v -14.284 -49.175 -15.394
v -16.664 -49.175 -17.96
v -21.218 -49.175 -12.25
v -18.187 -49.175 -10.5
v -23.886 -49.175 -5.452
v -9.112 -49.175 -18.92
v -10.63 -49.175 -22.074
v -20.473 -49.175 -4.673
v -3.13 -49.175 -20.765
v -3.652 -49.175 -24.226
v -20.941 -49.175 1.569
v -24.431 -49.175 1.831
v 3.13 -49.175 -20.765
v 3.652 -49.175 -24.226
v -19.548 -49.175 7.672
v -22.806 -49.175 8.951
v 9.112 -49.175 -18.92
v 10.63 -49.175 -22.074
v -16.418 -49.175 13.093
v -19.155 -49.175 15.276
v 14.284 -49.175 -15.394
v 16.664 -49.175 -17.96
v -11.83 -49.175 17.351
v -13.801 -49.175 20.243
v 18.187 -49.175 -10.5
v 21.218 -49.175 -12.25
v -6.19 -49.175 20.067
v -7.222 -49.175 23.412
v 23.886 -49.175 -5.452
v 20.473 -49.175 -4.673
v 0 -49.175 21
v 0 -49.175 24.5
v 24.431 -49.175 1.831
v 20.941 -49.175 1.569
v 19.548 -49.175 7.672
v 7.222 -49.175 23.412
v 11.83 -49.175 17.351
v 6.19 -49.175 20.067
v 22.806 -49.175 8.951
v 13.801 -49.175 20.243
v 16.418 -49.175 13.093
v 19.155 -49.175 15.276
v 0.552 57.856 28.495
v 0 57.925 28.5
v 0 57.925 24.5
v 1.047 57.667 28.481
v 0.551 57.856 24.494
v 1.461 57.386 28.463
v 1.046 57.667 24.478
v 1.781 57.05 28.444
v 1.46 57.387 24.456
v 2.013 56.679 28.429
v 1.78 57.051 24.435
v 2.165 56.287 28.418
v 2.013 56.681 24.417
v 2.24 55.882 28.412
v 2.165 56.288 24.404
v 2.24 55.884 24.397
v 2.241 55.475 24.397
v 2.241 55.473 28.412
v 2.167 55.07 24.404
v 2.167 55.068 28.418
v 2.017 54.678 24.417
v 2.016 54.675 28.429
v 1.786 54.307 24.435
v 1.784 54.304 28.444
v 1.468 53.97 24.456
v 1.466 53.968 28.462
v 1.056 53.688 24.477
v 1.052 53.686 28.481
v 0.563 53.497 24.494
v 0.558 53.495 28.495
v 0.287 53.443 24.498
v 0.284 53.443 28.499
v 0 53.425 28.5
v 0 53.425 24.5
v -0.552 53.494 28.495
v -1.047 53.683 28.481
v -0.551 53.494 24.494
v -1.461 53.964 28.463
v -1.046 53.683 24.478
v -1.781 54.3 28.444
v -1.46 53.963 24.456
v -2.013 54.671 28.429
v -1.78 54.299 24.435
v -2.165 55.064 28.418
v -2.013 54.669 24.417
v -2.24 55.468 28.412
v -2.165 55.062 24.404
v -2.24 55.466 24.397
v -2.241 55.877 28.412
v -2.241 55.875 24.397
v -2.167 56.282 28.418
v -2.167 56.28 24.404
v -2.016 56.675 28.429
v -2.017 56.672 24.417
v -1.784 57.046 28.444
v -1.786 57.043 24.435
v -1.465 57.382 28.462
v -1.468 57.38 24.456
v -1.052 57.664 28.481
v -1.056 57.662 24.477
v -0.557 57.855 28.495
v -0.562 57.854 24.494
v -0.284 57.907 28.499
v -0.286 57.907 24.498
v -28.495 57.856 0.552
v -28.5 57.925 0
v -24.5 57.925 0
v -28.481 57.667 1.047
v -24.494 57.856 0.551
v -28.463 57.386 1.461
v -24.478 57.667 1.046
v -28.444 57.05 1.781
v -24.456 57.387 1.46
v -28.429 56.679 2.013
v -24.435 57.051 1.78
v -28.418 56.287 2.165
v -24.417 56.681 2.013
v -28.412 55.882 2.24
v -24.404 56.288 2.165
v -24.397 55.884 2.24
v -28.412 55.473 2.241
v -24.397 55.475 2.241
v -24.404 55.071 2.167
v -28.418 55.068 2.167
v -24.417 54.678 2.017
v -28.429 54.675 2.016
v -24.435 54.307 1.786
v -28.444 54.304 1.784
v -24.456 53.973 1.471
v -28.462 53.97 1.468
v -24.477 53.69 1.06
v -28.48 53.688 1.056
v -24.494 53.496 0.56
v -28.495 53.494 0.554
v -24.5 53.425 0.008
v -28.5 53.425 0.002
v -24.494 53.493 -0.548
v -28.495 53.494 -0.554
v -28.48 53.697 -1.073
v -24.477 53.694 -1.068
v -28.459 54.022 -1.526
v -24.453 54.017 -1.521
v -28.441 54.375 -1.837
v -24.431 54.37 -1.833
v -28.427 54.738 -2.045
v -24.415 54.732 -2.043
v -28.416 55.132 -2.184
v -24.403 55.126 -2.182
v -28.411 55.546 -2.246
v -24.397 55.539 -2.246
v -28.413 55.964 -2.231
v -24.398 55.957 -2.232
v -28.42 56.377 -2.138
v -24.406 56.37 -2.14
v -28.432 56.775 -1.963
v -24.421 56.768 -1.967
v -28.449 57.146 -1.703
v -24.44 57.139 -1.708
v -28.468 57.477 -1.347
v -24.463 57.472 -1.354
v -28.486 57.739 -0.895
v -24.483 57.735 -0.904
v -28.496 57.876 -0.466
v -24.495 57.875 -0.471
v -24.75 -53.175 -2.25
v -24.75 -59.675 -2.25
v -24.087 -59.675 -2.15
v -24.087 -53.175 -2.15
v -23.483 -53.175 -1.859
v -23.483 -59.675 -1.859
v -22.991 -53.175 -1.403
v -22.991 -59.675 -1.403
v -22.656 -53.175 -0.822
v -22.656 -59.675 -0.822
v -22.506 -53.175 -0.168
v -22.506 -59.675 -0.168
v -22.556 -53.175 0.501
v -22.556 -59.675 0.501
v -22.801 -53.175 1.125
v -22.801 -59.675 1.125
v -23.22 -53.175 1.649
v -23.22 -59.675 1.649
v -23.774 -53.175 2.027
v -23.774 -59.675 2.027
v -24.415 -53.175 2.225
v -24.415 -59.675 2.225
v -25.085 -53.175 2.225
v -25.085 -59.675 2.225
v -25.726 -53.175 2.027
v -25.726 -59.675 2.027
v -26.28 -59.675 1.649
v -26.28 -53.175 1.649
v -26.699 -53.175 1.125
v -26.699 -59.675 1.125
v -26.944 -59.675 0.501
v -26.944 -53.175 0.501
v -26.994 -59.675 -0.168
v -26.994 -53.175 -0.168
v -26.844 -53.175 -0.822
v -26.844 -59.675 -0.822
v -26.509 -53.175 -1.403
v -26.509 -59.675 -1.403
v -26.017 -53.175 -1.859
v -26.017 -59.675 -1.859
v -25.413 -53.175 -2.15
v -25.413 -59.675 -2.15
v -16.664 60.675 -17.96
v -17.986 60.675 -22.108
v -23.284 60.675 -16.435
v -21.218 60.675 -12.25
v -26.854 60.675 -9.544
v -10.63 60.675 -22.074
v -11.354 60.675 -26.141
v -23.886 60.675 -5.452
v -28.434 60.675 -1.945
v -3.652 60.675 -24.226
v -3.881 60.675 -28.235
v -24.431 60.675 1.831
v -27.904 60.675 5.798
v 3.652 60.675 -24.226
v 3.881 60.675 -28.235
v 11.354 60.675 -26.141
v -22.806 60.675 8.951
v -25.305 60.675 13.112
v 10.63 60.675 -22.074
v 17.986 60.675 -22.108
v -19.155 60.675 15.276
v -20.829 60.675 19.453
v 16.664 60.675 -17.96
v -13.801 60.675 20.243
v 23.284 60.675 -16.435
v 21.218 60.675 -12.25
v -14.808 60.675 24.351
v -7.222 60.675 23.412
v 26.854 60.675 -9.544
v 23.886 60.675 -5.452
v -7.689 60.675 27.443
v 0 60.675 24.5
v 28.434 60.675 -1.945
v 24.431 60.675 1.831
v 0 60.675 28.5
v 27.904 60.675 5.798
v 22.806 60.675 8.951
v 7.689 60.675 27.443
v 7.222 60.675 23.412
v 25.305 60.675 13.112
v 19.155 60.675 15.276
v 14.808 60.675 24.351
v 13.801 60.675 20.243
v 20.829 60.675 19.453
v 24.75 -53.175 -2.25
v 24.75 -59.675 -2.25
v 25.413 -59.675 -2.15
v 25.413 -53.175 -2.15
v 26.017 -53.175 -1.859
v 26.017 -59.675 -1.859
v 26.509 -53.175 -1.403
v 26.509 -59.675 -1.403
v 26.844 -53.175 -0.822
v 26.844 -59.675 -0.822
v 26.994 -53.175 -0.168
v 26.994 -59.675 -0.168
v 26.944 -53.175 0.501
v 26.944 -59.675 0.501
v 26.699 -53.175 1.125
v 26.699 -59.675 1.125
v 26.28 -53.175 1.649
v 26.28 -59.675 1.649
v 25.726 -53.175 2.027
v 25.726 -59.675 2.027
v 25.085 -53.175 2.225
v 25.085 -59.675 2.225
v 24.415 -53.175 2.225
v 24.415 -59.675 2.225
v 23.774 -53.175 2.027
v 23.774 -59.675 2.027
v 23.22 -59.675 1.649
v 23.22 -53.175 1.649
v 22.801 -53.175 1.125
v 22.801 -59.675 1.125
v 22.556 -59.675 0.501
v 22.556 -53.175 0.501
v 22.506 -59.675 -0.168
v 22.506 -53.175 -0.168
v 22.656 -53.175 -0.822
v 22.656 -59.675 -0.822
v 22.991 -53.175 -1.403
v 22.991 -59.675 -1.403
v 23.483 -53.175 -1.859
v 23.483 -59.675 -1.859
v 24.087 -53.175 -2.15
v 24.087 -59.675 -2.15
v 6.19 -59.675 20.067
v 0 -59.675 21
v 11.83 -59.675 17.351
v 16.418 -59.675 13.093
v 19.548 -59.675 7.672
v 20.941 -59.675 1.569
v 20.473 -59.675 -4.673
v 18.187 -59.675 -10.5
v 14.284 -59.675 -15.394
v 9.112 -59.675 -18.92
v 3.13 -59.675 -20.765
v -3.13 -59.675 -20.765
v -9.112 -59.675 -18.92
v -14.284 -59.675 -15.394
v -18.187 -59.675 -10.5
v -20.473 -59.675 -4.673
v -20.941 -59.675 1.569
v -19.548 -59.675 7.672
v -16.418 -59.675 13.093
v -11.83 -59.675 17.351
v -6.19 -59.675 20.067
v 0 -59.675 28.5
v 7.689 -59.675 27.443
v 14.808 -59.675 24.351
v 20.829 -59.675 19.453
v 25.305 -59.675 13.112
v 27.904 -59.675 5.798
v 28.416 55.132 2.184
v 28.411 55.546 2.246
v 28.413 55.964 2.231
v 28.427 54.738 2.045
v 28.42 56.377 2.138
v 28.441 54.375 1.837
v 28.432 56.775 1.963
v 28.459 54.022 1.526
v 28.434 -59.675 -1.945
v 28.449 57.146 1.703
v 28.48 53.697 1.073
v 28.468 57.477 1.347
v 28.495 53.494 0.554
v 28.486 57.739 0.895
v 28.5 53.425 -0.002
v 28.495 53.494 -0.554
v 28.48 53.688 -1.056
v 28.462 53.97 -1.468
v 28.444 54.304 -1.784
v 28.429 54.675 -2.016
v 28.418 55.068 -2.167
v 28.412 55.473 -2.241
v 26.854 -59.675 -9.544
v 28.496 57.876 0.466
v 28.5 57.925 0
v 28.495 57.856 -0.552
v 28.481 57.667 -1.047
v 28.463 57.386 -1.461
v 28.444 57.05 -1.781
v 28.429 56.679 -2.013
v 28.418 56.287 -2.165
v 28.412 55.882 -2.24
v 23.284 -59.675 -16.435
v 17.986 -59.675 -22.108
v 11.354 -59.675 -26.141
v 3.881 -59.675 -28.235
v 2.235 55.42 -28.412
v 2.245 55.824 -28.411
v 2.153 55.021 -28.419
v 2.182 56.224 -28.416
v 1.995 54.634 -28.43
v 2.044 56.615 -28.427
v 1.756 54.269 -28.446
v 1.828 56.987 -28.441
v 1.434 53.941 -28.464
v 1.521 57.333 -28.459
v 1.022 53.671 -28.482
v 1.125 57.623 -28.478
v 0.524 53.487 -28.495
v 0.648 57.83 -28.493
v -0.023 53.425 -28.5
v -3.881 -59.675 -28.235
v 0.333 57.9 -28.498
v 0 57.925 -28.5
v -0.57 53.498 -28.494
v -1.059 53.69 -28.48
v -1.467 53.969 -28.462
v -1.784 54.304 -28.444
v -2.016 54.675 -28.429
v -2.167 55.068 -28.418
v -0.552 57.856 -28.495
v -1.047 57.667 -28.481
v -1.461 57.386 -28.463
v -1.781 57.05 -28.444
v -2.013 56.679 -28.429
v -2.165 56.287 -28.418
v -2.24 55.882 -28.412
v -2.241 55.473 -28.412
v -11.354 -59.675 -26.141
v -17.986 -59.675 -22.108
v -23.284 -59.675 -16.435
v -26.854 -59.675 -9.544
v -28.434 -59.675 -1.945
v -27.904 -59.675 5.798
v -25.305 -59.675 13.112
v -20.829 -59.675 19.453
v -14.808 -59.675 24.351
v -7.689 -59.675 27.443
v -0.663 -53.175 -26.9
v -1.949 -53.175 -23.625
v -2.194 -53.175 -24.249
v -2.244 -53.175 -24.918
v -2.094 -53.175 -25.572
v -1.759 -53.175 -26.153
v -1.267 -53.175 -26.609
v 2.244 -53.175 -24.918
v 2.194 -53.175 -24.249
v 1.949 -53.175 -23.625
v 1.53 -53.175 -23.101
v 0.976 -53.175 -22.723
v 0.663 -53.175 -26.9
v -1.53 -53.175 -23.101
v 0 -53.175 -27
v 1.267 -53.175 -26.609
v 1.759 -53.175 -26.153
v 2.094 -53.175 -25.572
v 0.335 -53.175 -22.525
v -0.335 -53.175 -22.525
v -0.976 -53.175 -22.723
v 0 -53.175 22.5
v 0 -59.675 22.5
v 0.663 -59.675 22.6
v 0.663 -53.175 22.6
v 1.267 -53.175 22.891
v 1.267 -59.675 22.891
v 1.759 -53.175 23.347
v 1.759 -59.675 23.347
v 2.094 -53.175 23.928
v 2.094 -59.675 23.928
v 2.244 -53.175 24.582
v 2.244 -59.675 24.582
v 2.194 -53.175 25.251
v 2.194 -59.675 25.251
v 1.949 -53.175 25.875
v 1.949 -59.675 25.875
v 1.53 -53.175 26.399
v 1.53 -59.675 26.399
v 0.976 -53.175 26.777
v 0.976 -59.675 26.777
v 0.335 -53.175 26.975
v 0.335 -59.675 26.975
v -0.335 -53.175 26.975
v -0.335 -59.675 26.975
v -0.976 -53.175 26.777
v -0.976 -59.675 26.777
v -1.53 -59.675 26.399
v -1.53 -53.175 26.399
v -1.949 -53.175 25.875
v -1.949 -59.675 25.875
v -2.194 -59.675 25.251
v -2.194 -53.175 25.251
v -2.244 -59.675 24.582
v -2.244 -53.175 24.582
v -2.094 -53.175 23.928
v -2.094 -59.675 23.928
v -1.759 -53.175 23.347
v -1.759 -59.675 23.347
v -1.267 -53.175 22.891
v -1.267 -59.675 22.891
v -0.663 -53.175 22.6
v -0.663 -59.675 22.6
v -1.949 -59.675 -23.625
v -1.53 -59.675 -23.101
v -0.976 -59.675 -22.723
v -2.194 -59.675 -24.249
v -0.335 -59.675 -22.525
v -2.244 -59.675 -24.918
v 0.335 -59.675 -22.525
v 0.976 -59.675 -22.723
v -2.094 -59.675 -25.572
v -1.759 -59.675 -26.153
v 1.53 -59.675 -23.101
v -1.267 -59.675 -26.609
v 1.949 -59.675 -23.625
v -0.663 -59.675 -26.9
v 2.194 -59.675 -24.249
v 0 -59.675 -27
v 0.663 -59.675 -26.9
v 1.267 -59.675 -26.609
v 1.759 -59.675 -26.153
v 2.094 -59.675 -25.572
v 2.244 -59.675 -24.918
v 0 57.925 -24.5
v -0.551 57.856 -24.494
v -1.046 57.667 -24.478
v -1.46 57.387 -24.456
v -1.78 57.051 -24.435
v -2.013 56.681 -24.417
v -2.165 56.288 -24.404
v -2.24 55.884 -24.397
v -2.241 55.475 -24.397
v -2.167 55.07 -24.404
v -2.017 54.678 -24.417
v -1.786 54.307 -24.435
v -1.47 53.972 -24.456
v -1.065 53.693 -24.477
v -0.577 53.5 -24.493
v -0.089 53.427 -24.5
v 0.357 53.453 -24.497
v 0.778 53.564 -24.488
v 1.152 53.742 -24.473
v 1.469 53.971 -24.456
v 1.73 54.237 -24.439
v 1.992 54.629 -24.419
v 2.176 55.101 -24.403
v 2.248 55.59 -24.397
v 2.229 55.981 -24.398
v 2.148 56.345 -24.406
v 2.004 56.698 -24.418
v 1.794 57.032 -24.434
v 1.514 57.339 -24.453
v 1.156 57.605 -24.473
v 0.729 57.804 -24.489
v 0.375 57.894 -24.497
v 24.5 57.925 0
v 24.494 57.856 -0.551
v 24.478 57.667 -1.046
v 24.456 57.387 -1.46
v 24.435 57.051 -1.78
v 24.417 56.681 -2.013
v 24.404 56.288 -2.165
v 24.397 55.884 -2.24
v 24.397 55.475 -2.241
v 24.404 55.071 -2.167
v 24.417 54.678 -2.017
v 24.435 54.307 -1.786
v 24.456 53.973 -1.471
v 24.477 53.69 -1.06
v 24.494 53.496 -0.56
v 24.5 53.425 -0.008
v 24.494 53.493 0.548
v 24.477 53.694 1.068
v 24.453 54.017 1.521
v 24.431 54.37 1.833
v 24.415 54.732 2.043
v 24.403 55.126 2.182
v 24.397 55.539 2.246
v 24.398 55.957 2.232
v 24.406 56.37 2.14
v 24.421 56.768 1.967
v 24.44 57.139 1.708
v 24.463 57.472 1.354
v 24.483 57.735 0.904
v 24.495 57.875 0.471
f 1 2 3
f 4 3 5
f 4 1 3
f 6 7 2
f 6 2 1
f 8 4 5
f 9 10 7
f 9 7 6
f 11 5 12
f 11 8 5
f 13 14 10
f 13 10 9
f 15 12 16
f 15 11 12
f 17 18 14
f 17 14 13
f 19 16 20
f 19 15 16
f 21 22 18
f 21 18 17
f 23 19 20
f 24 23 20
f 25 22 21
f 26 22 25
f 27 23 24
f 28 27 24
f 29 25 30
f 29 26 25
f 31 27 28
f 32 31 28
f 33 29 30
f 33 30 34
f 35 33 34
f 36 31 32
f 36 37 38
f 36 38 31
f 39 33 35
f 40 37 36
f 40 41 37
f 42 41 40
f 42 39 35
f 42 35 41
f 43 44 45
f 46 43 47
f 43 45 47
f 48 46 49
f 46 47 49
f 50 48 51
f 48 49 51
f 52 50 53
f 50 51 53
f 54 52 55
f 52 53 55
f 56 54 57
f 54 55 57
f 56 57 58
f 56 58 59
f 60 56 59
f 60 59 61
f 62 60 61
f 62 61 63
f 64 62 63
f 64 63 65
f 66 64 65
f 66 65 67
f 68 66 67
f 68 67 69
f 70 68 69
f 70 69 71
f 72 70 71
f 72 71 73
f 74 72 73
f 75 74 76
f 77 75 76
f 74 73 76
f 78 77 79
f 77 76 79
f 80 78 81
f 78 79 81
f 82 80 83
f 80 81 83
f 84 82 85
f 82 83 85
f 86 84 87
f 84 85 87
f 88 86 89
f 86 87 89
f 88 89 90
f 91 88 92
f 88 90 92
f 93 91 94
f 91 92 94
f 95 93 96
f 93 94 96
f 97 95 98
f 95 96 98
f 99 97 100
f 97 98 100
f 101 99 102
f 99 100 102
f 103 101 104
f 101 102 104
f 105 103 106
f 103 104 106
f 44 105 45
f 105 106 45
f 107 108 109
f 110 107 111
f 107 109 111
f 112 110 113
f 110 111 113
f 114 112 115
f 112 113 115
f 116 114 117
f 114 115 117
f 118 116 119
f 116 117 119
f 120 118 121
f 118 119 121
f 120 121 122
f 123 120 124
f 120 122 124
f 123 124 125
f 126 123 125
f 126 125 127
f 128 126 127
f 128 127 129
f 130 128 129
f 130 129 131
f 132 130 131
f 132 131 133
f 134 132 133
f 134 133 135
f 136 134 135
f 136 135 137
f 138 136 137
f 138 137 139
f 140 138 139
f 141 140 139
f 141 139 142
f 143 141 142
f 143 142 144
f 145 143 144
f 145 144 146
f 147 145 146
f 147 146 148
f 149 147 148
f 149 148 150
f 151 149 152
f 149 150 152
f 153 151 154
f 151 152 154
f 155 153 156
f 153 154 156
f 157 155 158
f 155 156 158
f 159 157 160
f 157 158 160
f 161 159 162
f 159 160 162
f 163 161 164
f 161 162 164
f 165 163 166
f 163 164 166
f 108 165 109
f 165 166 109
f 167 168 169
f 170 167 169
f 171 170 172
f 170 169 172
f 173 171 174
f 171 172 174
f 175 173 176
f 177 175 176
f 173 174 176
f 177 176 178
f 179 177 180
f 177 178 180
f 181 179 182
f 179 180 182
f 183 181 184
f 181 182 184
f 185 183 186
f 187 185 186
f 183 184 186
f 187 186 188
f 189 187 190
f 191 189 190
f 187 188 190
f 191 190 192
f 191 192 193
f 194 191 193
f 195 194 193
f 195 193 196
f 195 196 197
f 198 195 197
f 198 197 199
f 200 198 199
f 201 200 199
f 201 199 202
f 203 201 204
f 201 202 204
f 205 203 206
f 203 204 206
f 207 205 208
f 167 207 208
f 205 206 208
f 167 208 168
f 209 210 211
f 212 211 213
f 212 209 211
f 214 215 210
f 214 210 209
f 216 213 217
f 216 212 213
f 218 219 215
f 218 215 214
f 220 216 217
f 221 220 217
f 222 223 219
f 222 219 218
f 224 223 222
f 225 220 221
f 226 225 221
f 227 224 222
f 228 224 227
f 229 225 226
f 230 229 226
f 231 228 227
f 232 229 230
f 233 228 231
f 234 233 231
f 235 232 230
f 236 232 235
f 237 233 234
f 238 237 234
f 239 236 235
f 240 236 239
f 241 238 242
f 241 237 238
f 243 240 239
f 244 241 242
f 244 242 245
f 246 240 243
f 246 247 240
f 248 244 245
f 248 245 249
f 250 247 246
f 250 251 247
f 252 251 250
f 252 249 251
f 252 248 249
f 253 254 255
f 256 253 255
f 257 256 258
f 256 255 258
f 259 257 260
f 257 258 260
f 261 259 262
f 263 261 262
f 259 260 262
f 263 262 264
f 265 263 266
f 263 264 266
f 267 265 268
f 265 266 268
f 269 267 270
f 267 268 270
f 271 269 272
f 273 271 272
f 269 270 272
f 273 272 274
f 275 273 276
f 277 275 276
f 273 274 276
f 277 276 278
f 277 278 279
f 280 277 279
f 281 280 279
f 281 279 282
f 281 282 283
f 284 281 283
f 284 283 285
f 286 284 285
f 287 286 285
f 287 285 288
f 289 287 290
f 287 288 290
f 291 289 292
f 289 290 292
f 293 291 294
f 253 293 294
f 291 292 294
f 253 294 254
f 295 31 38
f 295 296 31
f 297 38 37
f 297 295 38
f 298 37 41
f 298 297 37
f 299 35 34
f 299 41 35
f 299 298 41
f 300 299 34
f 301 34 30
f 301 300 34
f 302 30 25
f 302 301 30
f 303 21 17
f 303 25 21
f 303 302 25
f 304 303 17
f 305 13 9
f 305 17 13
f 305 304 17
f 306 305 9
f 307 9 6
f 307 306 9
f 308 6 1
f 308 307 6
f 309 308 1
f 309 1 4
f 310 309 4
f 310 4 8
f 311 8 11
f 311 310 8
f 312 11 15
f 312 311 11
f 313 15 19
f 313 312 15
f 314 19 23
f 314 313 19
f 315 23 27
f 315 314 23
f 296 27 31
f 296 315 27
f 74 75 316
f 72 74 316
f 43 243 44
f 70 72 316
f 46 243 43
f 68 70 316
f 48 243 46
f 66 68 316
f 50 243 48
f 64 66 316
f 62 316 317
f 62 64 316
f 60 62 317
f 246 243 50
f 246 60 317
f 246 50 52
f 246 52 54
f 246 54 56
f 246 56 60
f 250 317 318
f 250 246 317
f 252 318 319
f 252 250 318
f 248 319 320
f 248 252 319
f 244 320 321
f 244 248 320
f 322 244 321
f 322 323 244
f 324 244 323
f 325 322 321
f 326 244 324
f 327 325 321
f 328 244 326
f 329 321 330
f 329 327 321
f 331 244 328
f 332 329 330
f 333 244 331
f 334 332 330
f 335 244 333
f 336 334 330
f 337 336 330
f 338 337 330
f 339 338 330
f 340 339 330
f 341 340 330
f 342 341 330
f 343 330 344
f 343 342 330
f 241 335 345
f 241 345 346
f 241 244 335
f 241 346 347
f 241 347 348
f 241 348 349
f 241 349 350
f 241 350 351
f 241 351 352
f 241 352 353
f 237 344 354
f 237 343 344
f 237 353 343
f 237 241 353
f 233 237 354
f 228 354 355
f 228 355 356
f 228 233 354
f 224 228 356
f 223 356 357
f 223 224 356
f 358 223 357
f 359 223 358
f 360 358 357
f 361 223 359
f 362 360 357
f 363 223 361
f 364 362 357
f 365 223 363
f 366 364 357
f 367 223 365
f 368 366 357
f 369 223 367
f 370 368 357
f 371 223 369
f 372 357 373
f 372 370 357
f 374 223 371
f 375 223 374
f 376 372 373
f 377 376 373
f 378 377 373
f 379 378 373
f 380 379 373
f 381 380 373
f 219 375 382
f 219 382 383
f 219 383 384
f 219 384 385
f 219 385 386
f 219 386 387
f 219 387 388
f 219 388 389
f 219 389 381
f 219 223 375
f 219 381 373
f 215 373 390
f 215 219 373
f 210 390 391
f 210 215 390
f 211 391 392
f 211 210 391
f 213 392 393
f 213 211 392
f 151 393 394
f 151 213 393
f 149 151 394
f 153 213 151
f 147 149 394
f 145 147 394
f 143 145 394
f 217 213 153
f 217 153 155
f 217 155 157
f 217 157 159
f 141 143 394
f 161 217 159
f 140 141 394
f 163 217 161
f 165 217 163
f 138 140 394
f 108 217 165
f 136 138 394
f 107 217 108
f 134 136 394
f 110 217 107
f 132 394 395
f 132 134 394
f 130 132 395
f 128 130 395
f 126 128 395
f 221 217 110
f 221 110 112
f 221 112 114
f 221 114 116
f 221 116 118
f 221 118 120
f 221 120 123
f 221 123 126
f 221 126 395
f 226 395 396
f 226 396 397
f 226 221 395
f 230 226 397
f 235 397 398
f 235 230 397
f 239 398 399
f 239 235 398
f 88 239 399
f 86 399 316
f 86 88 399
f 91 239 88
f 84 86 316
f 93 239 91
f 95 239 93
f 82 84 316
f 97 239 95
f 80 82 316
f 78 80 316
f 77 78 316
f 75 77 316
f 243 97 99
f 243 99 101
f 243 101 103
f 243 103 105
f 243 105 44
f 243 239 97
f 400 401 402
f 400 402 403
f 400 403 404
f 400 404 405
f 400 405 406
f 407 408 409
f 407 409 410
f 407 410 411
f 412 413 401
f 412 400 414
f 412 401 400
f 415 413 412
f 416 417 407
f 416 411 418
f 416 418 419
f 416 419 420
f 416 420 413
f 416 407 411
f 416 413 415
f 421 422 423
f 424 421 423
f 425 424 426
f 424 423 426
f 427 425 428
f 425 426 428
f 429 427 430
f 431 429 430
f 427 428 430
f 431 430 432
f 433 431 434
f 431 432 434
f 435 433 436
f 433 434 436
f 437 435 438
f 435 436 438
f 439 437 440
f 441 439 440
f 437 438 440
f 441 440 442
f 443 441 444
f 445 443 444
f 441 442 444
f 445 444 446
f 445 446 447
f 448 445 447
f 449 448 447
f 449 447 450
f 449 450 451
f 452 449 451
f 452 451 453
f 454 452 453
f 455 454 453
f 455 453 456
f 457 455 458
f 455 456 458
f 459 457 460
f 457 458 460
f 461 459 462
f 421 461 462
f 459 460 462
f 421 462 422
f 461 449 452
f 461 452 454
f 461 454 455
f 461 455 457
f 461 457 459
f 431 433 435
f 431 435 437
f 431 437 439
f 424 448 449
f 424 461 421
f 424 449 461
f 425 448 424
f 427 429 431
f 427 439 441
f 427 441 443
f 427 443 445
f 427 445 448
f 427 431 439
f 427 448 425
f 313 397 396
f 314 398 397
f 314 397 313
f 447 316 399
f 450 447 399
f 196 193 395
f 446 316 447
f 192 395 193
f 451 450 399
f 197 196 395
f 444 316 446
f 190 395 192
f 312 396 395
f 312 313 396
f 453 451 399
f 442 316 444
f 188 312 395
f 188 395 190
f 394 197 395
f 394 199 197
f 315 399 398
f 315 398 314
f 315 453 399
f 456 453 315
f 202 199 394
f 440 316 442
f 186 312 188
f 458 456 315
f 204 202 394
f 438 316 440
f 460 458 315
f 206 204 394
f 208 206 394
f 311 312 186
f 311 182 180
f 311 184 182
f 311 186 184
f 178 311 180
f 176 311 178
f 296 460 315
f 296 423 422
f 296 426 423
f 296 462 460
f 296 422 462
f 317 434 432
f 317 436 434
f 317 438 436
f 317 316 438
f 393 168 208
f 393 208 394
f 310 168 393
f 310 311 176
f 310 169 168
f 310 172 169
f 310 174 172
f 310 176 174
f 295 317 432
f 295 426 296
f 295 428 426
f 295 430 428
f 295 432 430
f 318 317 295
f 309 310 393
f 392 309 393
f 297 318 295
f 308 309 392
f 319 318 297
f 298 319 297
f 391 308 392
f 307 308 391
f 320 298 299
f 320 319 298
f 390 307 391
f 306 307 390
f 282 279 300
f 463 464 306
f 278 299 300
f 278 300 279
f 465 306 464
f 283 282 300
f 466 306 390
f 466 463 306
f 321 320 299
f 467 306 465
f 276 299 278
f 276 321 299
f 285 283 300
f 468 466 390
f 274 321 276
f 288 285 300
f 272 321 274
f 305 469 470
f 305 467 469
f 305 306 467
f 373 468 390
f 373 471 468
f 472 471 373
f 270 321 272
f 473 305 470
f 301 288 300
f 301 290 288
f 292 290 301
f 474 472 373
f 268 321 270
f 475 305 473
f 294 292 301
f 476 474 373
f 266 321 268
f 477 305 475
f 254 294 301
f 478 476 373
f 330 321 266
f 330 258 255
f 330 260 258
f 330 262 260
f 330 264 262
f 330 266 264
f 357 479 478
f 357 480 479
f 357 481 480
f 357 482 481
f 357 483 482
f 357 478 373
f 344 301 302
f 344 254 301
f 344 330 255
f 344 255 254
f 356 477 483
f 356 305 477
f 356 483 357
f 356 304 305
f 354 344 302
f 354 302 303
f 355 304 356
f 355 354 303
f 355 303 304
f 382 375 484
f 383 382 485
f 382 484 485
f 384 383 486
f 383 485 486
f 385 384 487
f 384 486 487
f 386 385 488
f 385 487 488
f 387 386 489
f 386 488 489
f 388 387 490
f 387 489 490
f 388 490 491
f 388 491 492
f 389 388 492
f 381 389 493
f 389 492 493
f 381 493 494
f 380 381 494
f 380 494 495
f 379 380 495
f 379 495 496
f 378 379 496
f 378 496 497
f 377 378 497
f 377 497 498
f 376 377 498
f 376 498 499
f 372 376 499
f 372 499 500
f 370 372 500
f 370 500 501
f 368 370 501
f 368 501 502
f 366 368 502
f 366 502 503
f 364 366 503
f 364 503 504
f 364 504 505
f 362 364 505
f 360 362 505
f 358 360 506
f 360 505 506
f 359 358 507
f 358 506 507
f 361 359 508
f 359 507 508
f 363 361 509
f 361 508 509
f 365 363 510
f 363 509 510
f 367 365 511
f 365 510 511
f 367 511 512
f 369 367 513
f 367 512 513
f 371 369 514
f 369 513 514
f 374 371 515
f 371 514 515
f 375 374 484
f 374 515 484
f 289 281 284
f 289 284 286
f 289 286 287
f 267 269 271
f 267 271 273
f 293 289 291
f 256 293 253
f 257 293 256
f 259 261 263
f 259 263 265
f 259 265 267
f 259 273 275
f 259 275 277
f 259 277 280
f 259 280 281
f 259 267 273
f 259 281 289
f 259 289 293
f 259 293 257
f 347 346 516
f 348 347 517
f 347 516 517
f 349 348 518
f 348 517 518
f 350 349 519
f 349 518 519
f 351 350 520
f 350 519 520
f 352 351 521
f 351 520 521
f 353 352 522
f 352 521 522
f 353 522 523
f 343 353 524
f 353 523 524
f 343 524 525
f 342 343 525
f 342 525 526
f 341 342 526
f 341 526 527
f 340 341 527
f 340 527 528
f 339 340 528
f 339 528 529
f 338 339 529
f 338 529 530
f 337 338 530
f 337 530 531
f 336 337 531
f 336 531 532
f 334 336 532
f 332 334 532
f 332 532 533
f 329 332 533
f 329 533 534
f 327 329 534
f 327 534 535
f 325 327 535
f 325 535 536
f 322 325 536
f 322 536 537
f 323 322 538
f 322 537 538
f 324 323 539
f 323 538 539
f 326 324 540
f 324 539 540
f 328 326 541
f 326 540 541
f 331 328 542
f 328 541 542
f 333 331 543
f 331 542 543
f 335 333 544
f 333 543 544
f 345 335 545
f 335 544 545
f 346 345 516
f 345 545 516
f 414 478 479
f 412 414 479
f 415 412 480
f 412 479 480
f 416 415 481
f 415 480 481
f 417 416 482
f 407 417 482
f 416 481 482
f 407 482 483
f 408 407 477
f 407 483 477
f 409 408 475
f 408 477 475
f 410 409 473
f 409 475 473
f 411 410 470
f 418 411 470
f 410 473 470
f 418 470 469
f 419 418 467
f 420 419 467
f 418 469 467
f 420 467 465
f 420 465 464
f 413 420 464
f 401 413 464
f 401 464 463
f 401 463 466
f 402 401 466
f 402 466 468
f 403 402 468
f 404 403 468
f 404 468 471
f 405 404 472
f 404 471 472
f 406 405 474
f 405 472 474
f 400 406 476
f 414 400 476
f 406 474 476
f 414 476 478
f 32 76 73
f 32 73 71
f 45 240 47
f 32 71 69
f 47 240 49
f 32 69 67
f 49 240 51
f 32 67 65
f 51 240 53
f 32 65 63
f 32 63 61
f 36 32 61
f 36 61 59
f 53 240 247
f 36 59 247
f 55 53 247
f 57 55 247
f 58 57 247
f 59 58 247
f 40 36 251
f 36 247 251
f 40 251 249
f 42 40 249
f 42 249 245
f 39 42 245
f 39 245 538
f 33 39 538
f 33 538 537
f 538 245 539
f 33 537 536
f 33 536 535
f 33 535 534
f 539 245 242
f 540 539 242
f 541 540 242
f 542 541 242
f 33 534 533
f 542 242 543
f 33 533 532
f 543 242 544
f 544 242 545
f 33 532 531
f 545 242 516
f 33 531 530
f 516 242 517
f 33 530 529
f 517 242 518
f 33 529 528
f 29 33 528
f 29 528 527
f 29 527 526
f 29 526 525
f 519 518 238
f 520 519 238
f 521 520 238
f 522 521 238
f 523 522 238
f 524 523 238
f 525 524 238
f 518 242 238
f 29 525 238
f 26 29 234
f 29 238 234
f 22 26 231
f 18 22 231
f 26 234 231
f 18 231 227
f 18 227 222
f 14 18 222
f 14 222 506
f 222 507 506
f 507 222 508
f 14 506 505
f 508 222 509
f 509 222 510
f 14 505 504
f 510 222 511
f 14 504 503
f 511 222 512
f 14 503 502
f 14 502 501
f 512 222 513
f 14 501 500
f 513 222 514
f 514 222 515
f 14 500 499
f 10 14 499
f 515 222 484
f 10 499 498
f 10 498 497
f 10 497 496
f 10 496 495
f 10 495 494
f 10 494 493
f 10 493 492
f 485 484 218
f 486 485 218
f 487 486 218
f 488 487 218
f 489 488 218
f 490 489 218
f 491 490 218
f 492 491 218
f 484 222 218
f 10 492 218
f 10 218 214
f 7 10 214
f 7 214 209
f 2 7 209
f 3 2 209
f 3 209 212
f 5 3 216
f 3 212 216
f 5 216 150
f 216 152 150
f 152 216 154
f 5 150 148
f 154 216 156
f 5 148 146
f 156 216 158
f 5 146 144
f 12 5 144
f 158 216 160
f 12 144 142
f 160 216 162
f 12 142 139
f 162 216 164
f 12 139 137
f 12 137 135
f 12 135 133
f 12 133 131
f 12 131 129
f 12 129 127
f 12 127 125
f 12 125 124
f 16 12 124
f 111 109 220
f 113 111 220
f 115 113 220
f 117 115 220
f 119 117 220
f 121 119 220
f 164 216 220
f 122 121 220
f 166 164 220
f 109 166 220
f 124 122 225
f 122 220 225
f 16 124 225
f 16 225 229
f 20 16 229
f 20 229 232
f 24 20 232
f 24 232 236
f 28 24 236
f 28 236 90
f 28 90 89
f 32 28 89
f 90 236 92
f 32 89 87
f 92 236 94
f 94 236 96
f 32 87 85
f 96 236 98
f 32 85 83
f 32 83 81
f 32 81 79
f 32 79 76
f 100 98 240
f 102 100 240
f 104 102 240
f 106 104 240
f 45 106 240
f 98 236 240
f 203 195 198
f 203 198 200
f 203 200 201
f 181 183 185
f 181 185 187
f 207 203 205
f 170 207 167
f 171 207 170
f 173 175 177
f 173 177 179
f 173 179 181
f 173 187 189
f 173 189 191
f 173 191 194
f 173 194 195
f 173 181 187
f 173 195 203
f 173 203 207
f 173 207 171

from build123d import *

# Parameters (mm, degrees)
SKETCH1_R           = 28.5
SKETCH1_R_2         = 21
BOSS_EXTRUDE1_DEPTH = 60.675
SKETCH2_R           = 2.25
CUT_EXTRUDE1_DEPTH  = 73.841990809
CIRPATTERN1_COUNT   = 4
CUT_EXTRUDE4_START  = -1
SKETCH5_R           = 28.5
CUT_EXTRUDE4_DEPTH  = 1
SKETCH3_R           = 2.25
CUT_EXTRUDE2_DEPTH  = 6.5
SKETCH4_R           = 24.5
CUT_EXTRUDE3_DEPTH  = 109.85


with BuildPart() as part:
    # Sketch1 → Boss-Extrude1 (new, symmetric)
    with BuildSketch(Plane(origin=(0, 0, 0), x_dir=(1, 0, 0), z_dir=(0, 1, 0))):
        with Locations(Location((0, 0, 0), (0, 0, 270))):
            Circle(SKETCH1_R)
        with Locations(Location((0, 0, 0), (0, 0, 270))):
            Circle(SKETCH1_R_2, mode=Mode.SUBTRACT)
    extrude(amount=BOSS_EXTRUDE1_DEPTH, both=True)

    # Sketch2 → Cut-Extrude1 (cut, through all)
    with BuildSketch(Plane.XY):
        with Locations(Location((0, 55.675, 0), (0, 0, 90))):
            Circle(SKETCH2_R)
    cut_extrude1 = extrude(amount=-CUT_EXTRUDE1_DEPTH, mode=Mode.SUBTRACT)

    # CirPattern1: Cut-Extrude1 ×4 about axis
    cirpattern1_axis = Axis((0, 60.675, 0), (0, -1, 0))
    for i in range(1, CIRPATTERN1_COUNT):
        add(cut_extrude1.rotate(cirpattern1_axis, i * 360 / CIRPATTERN1_COUNT), mode=Mode.SUBTRACT)

    # Sketch5 → Cut-Extrude4 (cut)
    with BuildSketch(Plane.XZ.offset(60.675).offset(CUT_EXTRUDE4_START)):
        with Locations(Location((0, 0, 0), (0, 0, 270))):
            Circle(SKETCH5_R)
    extrude(amount=CUT_EXTRUDE4_DEPTH, mode=Mode.SUBTRACT)

    # Sketch3 → Cut-Extrude2 (cut)
    with BuildSketch(Plane.XZ.offset(59.675)):
        with Locations(Location((0, 24.75, 0), (0, 0, 270))):
            Circle(SKETCH3_R)
        with Locations(Location((24.75, 0, 0), (0, 0, 270))):
            Circle(SKETCH3_R)
        with Locations(Location((0, -24.75, 0), (0, 0, 270))):
            Circle(SKETCH3_R)
        with Locations(Location((-24.75, 0, 0), (0, 0, 270))):
            Circle(SKETCH3_R)
    extrude(amount=-CUT_EXTRUDE2_DEPTH, mode=Mode.SUBTRACT)

    # Sketch4 → Cut-Extrude3 (cut)
    with BuildSketch(Plane(origin=(0, 60.675, 0), x_dir=(1, 0, 0), z_dir=(0, 1, 0))):
        with Locations(Location((0, 0, 0), (0, 0, 270))):
            Circle(SKETCH4_R)
    extrude(amount=-CUT_EXTRUDE3_DEPTH, mode=Mode.SUBTRACT)


solid = part.part
